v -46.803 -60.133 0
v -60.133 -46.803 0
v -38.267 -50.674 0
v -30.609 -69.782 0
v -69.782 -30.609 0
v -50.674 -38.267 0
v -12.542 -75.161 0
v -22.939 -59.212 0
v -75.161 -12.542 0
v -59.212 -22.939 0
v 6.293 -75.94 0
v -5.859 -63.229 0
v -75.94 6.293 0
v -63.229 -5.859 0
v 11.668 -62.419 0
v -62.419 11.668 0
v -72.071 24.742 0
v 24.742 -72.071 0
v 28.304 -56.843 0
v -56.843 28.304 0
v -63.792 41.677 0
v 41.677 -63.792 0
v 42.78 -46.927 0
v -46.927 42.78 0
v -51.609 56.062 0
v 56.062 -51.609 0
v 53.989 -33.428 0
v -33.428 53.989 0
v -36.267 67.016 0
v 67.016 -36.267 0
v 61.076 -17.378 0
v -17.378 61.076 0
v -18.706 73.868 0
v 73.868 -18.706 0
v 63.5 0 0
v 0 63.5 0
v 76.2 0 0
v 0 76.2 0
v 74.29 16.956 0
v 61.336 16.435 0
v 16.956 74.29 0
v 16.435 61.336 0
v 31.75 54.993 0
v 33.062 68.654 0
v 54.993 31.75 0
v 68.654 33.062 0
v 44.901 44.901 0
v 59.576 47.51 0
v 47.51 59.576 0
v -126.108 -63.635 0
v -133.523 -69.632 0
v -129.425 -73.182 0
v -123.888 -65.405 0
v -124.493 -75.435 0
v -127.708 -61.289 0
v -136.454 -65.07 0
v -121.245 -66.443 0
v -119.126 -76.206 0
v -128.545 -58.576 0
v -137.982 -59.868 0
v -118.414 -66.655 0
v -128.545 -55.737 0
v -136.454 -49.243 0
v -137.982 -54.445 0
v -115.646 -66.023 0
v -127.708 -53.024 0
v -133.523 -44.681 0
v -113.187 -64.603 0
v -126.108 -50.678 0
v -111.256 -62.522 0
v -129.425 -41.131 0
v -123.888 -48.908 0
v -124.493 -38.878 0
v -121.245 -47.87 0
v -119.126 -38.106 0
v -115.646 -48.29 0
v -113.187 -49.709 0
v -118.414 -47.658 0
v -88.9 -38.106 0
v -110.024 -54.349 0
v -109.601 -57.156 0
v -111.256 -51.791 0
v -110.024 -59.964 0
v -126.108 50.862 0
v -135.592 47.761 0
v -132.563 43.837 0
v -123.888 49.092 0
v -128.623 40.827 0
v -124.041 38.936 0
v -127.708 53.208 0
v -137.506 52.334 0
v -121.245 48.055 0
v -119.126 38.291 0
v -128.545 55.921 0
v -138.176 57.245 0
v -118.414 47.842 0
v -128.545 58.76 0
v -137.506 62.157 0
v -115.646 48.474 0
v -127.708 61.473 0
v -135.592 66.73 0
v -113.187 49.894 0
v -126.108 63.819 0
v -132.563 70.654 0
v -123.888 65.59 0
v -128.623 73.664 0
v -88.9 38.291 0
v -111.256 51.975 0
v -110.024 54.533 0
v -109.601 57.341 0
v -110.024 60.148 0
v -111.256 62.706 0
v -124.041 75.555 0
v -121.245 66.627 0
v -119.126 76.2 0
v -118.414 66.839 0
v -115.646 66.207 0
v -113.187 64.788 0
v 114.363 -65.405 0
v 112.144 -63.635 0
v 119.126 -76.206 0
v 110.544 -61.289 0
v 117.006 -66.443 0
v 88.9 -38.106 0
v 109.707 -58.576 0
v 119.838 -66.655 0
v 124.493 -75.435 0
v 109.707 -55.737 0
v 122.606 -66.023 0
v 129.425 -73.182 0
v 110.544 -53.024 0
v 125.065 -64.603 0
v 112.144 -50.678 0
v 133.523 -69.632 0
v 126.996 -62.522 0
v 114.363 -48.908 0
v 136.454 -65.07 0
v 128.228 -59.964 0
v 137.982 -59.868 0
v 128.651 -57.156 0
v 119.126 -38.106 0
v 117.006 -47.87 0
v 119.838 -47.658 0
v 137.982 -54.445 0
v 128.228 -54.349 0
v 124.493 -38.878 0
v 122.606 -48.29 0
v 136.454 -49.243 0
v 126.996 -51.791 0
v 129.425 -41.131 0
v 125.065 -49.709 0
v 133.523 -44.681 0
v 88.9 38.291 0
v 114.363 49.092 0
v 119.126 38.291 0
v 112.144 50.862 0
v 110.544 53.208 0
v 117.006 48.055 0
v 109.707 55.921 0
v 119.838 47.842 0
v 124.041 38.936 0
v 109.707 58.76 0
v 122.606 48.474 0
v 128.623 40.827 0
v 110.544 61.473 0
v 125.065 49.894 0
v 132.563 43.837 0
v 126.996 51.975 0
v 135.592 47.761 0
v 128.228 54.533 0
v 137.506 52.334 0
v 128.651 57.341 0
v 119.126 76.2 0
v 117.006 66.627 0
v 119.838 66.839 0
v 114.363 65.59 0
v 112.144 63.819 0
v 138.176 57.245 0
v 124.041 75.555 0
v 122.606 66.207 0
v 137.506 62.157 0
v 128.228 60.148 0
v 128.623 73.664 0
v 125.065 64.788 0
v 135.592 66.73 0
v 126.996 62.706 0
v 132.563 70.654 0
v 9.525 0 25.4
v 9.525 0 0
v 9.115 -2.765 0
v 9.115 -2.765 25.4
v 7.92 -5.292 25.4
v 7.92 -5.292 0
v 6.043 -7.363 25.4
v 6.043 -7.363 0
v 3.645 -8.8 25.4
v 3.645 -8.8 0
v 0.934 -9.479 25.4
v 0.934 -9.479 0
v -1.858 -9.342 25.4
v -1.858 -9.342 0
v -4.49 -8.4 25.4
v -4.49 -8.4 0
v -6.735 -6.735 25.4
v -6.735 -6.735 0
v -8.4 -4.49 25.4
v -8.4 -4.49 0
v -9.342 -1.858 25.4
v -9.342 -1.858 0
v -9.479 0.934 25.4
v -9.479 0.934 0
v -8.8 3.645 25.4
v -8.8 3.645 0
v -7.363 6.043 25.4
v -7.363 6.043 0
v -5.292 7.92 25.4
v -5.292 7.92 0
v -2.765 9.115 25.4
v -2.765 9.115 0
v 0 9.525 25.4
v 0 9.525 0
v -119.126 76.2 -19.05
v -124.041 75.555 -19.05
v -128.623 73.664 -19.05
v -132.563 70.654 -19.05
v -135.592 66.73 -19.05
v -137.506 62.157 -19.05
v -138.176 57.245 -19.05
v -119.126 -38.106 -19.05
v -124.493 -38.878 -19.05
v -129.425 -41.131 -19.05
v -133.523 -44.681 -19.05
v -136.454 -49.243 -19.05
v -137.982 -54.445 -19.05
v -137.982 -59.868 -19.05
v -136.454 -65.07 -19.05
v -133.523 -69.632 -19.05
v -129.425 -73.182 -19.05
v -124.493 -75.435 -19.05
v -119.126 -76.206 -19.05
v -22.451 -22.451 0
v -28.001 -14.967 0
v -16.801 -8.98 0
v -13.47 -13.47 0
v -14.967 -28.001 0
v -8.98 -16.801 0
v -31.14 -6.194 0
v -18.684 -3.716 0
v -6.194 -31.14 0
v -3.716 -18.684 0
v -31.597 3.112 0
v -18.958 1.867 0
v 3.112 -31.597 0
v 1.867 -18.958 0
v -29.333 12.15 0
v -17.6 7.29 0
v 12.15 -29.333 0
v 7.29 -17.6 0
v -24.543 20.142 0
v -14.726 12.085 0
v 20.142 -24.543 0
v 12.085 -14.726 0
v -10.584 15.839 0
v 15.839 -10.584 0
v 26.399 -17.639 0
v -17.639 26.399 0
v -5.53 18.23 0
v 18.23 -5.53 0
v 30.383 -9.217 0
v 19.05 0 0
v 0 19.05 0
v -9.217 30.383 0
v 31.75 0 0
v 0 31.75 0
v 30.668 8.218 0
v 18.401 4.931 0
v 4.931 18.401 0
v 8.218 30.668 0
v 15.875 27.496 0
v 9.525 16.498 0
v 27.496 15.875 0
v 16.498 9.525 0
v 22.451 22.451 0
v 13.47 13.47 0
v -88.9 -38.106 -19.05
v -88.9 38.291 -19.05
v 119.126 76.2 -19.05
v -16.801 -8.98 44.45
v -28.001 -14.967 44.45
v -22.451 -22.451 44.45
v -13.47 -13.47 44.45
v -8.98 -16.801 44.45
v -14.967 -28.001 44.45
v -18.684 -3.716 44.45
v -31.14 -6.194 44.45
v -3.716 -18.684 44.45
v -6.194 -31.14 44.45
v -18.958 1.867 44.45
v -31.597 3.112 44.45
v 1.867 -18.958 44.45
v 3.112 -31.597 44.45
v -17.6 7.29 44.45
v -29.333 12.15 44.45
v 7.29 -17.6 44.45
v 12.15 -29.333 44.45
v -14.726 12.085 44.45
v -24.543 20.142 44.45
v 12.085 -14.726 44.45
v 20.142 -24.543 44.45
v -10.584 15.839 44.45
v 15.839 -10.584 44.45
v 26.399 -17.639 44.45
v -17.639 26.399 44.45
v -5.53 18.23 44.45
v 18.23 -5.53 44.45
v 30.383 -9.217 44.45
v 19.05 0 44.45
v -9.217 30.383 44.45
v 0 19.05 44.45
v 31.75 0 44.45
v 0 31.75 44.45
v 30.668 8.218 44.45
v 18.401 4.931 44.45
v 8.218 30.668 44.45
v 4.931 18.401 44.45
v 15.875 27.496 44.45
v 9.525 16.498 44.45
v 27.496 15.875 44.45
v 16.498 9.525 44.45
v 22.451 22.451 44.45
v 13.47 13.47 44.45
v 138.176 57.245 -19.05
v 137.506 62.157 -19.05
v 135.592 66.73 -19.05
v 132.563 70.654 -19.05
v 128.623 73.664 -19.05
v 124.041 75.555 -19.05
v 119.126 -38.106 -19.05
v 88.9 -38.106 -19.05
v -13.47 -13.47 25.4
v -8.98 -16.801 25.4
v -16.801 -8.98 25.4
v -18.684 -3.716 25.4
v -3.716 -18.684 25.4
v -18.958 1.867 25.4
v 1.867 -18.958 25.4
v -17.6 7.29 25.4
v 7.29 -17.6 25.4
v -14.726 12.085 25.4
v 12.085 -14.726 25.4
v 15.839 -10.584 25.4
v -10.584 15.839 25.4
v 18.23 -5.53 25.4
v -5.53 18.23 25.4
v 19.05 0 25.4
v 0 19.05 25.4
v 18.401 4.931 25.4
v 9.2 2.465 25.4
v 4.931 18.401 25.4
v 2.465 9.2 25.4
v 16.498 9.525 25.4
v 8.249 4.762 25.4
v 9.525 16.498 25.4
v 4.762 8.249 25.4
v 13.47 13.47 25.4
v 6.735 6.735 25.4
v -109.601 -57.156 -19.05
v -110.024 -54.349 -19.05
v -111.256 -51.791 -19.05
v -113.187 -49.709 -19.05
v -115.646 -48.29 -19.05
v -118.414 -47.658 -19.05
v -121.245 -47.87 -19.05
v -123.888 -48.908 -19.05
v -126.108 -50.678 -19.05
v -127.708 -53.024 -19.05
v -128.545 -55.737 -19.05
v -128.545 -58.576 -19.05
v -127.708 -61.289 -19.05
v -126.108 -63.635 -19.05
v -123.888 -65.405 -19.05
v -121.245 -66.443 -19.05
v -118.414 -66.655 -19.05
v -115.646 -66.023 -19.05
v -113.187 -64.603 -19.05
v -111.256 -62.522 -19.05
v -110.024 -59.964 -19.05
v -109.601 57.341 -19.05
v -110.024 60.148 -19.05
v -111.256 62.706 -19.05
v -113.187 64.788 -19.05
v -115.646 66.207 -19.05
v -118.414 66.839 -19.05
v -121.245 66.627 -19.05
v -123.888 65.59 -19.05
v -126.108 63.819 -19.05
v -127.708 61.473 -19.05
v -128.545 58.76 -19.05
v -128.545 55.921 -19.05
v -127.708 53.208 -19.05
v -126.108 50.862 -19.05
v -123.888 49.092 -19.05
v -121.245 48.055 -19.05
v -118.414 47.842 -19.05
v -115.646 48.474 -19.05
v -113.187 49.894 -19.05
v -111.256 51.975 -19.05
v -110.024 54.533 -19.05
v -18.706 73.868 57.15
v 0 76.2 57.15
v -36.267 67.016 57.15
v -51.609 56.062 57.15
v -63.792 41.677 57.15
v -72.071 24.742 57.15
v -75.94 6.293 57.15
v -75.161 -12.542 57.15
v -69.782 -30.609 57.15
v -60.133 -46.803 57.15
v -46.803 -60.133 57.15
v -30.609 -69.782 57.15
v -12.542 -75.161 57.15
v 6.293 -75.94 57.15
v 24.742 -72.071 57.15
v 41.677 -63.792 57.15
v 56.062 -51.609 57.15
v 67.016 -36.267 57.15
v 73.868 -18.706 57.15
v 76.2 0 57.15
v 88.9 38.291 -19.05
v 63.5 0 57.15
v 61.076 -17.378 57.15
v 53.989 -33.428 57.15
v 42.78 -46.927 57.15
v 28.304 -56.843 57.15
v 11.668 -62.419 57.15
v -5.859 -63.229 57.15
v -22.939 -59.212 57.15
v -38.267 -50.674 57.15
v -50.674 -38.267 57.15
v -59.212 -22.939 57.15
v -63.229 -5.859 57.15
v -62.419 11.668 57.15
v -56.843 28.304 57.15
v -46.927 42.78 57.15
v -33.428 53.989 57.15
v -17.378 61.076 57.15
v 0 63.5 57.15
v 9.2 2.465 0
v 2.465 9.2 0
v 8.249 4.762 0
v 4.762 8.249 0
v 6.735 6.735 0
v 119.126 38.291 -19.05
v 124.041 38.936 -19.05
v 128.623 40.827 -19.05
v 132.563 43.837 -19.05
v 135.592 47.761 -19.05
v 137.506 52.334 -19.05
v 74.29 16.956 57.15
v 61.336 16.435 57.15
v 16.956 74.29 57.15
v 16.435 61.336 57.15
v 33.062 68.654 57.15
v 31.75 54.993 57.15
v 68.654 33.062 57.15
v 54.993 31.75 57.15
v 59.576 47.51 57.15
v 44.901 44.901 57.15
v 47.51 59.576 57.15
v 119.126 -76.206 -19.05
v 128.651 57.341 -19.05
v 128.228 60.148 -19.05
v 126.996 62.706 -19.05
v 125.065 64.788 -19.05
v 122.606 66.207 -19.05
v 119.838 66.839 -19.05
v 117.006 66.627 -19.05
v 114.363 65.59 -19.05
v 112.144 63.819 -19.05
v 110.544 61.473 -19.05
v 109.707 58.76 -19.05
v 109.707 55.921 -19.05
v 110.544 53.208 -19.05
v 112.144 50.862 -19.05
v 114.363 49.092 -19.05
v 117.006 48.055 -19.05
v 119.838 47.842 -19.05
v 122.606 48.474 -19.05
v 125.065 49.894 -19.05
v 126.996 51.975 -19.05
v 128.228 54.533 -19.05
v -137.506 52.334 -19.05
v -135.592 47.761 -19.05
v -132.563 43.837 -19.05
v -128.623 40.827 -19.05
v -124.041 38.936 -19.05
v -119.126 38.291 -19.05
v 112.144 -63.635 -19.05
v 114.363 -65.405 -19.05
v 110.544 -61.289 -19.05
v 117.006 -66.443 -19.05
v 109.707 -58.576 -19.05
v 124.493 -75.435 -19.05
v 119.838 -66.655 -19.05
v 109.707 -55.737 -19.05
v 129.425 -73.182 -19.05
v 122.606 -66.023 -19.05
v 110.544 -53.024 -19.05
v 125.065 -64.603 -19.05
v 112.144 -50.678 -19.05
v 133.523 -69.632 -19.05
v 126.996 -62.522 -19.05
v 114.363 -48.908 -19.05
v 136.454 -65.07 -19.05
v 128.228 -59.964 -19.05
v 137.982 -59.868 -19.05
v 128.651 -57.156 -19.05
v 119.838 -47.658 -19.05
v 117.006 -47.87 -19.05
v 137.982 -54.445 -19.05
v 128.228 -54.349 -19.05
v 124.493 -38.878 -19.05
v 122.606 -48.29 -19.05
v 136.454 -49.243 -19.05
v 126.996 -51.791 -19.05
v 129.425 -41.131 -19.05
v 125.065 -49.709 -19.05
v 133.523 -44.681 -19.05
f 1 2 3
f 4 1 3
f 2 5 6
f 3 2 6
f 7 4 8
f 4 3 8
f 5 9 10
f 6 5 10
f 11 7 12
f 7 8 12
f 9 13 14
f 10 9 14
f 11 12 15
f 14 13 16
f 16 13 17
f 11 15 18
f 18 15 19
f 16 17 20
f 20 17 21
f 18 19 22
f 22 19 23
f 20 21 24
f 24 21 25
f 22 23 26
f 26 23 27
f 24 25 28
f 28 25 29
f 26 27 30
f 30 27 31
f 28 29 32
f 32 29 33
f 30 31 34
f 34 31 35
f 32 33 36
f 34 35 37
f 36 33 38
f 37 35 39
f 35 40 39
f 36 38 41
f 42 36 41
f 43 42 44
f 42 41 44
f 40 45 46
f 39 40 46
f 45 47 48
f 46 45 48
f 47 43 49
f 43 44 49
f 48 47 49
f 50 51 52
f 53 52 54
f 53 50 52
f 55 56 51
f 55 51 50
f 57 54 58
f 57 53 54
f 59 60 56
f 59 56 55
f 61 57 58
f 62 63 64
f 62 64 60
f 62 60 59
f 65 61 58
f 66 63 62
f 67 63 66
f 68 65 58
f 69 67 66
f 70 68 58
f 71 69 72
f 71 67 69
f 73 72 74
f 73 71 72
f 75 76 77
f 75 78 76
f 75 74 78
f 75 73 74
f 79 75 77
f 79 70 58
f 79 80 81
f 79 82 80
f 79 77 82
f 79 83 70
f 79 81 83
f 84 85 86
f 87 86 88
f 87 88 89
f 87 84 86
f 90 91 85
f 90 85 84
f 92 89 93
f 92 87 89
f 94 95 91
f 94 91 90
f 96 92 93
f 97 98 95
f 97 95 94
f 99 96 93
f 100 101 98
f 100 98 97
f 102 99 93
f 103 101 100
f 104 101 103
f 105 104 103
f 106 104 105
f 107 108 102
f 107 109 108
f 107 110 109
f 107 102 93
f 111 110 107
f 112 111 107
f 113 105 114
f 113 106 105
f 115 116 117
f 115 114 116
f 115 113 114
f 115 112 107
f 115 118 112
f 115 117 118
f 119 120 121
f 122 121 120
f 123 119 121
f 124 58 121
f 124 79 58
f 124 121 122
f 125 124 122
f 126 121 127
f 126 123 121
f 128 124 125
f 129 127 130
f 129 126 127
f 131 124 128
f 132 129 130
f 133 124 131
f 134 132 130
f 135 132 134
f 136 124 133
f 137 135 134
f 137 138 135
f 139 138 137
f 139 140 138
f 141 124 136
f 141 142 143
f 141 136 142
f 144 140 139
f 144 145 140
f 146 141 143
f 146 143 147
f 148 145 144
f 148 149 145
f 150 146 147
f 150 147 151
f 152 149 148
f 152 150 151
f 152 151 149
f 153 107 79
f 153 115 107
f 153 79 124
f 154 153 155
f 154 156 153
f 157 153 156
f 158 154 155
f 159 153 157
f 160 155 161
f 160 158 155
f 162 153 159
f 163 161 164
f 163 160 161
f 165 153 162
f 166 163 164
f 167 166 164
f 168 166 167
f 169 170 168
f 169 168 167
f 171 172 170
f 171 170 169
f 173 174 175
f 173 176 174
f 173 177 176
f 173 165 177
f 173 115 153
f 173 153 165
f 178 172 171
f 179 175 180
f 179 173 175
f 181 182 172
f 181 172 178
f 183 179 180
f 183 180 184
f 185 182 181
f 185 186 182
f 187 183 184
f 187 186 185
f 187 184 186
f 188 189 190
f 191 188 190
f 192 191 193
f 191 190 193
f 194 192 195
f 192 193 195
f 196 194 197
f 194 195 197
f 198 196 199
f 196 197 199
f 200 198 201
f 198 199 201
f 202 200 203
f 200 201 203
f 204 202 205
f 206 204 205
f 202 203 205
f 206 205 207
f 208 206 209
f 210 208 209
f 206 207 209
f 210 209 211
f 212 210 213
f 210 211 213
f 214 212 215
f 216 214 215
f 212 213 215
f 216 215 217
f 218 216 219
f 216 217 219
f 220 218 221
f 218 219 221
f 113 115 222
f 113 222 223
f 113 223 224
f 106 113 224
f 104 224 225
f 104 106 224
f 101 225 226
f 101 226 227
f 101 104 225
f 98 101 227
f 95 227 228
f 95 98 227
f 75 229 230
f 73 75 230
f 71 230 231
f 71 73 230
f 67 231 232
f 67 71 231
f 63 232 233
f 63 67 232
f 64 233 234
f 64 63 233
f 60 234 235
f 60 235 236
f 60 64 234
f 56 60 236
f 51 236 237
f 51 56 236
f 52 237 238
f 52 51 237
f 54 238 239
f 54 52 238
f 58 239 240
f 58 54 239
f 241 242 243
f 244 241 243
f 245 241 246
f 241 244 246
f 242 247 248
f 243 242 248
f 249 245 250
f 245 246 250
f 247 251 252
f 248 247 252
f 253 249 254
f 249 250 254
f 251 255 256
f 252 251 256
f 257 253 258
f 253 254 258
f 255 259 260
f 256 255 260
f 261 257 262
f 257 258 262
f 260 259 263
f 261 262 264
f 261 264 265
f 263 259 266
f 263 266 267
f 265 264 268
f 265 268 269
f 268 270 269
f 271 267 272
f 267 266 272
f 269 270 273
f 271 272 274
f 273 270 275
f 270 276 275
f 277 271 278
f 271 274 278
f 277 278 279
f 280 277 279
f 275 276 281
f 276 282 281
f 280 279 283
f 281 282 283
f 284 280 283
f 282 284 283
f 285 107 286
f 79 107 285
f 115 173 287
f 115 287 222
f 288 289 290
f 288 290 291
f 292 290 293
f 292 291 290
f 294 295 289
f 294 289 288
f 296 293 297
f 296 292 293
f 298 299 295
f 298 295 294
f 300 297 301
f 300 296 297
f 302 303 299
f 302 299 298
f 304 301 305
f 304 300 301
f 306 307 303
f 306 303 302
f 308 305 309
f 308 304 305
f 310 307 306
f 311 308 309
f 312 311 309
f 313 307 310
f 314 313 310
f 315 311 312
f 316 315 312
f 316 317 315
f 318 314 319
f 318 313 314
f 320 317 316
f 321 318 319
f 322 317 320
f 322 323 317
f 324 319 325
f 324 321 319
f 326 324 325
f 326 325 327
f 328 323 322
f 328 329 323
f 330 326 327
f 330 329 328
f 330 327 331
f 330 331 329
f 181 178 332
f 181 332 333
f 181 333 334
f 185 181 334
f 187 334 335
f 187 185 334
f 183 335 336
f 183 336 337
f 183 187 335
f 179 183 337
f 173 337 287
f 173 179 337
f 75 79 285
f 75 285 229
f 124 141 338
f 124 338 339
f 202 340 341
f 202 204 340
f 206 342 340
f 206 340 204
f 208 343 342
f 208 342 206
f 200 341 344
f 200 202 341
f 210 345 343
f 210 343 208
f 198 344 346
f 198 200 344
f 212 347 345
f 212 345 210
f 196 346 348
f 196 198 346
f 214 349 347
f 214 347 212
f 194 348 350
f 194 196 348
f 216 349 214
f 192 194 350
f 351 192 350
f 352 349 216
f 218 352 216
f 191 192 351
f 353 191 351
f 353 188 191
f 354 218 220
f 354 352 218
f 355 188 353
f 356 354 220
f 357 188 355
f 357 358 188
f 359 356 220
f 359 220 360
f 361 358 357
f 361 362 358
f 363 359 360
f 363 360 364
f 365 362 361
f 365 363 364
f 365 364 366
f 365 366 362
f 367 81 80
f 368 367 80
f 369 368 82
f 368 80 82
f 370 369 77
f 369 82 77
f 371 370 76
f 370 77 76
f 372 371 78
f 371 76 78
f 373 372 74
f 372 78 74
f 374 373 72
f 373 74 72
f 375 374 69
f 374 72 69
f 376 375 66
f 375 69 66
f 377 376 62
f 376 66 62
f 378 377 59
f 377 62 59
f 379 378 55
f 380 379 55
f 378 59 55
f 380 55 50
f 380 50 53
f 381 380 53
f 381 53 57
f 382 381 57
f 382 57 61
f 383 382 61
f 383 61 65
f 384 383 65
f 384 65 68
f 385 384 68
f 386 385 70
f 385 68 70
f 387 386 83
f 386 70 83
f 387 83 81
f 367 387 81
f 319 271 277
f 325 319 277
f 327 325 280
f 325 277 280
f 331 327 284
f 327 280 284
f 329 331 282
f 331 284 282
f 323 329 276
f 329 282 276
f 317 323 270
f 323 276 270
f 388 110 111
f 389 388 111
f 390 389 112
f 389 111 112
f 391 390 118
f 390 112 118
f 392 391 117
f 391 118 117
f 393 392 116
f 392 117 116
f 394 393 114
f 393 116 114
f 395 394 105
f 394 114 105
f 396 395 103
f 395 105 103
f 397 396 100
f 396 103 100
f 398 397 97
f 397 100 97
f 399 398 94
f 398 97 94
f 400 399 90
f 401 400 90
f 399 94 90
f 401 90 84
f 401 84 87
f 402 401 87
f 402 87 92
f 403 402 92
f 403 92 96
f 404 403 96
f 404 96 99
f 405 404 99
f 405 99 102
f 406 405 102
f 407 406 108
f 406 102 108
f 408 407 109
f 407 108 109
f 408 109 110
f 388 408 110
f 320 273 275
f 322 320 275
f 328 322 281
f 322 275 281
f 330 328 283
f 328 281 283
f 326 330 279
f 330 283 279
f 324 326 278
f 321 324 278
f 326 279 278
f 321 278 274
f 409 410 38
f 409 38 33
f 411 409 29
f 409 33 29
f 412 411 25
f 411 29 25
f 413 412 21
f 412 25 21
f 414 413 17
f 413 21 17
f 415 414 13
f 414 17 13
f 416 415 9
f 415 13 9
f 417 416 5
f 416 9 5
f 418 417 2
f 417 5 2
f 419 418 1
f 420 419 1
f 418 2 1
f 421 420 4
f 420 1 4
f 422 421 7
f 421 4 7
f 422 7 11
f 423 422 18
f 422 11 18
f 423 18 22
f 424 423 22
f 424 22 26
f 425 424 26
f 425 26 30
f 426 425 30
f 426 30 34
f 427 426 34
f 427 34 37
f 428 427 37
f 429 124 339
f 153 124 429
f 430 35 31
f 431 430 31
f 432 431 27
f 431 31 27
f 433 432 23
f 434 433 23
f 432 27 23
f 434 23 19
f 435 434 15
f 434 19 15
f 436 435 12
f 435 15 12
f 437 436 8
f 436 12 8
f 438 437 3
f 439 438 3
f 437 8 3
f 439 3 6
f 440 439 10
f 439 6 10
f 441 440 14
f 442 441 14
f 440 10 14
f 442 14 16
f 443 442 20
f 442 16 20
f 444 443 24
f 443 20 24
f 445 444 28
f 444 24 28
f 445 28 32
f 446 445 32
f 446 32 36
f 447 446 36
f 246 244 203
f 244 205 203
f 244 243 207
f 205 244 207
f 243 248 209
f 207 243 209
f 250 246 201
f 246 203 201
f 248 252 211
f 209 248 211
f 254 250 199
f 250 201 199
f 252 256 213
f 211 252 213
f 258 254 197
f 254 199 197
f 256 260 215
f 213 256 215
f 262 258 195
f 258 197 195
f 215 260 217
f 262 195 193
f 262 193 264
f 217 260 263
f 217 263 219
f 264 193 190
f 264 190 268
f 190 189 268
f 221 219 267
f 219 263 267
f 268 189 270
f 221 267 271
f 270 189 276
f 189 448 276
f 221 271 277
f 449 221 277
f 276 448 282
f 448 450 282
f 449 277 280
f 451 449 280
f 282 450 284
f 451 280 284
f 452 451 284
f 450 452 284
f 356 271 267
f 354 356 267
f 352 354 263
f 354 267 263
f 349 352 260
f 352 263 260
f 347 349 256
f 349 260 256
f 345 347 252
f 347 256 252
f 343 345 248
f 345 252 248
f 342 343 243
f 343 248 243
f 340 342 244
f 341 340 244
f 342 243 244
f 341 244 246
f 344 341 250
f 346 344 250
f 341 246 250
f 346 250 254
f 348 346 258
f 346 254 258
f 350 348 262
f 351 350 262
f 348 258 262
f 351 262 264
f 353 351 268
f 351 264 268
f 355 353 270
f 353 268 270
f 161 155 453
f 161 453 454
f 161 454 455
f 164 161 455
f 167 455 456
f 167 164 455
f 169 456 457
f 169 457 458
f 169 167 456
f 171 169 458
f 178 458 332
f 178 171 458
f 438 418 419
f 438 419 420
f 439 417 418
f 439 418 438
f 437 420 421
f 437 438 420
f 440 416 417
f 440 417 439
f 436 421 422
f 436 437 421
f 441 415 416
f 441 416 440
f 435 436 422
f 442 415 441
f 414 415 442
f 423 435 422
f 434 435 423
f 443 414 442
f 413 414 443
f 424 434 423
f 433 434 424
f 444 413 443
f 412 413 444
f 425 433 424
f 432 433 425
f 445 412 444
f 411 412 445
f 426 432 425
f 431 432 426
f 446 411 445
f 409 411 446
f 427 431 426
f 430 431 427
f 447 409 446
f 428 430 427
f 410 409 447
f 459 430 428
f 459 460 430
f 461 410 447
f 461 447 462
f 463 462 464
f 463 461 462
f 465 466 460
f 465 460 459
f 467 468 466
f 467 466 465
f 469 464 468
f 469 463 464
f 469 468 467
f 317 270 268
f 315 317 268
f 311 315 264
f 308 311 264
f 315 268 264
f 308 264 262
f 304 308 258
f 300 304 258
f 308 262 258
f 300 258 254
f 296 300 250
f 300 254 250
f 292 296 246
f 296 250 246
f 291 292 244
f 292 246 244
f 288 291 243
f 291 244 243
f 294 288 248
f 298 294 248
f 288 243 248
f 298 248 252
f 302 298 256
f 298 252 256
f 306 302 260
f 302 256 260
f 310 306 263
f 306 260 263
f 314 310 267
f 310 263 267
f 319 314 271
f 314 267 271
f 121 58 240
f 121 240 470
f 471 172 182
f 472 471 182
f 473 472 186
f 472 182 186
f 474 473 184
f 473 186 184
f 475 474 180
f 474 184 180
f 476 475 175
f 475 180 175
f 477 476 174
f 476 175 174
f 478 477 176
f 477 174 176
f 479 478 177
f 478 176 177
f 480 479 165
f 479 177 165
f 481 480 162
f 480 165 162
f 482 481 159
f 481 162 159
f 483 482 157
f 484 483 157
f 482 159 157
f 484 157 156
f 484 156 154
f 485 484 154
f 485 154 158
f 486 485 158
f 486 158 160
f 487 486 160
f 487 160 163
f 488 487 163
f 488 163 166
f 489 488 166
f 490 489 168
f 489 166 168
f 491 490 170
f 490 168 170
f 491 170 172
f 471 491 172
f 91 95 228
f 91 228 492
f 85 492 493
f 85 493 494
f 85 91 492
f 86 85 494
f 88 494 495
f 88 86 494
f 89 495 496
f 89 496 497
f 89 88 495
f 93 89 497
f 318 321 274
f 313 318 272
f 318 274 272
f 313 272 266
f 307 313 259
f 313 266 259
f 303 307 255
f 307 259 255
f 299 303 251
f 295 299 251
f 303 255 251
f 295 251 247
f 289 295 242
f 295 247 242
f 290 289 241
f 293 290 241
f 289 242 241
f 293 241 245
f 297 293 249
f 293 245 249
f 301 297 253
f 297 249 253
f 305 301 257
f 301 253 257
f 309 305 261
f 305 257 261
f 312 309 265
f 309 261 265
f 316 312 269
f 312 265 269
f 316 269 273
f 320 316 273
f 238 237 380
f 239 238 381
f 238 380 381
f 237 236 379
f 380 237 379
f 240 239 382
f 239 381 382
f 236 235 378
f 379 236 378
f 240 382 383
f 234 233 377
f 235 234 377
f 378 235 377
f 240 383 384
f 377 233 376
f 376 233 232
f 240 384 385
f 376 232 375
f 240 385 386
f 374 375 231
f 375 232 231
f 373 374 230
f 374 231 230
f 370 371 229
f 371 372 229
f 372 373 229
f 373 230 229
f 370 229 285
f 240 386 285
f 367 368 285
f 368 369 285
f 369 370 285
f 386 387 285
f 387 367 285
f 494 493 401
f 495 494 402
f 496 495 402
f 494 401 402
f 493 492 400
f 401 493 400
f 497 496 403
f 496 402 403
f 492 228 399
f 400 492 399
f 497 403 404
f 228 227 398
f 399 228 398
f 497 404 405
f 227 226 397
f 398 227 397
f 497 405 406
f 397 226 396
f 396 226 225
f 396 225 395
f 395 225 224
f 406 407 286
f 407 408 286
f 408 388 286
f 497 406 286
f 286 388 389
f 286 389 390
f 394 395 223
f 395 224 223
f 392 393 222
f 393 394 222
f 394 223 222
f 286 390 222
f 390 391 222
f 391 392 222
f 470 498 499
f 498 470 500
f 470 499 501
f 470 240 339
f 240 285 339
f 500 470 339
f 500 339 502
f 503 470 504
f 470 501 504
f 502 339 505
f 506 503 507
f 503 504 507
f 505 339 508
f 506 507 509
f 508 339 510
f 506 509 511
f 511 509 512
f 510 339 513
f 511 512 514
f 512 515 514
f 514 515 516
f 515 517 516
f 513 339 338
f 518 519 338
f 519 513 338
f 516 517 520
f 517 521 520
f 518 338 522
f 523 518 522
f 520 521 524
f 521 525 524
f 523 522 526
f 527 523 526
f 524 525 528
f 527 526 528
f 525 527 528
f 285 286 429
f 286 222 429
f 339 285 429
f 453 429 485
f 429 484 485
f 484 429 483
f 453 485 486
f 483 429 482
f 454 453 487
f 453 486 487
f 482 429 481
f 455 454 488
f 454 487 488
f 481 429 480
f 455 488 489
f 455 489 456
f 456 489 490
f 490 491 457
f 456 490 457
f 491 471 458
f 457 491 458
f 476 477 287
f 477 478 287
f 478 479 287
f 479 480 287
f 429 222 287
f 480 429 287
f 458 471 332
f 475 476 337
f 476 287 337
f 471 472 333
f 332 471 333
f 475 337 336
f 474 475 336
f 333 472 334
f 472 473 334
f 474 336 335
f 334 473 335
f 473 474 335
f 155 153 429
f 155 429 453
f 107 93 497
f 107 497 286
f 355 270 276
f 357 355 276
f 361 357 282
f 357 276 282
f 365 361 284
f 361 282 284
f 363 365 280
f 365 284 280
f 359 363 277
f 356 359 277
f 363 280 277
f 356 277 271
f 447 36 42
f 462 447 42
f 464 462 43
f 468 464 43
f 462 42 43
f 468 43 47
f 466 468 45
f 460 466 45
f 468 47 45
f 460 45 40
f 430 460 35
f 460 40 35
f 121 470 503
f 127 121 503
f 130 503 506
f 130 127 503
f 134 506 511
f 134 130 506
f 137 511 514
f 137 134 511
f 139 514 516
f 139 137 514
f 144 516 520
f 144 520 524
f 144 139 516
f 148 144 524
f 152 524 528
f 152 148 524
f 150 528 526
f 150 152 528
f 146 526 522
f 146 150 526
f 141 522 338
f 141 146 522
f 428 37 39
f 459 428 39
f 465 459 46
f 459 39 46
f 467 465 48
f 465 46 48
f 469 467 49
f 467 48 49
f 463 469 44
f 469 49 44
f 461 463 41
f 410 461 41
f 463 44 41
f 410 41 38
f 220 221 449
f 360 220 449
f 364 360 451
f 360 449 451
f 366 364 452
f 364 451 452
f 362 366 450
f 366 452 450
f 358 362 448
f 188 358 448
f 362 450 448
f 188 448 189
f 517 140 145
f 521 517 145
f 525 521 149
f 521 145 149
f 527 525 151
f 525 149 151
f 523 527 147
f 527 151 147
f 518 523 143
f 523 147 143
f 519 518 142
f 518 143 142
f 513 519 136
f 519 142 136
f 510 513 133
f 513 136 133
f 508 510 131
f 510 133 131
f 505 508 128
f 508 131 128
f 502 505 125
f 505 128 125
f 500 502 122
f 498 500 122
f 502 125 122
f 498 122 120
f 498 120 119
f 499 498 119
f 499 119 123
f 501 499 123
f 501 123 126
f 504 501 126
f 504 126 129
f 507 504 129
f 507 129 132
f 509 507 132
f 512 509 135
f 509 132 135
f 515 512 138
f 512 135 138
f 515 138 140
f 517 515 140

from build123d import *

# Parameters (mm, degrees)
F0_R     = 9.525
F1_DEPTH = 19.05
F2_DEPTH = 57.15
F3_DEPTH = 44.45
F4_DEPTH = 25.4


with BuildPart() as f1:
    # F0 (on Top) → F1 (new body)
    with BuildSketch(Plane.XY):
        with BuildLine():
            Line((-88.899997, 38.29073), (-88.899997, 76.2))
            Line((-88.899997, 76.2), (-119.125959, 76.2))
            ThreePointArc((-119.125959, 76.2), (-132.562584, 70.654059), (-138.17572, 57.245365))
            ThreePointArc((-138.17572, 57.245365), (-132.562584, 43.836671), (-119.125959, 38.29073))
            Line((-119.125959, 38.29073), (-88.899997, 38.29073))
        make_face()
        with Locations((-119.125959, 57.34073)):
            Circle(F0_R, mode=Mode.SUBTRACT)
        with BuildLine():
            Line((-88.899997, -76.20642), (-88.899997, -38.10642))
            Line((-88.899997, -38.10642), (-119.125959, -38.10642))
            ThreePointArc((-119.125959, -38.10642), (-138.175959, -57.15642), (-119.125959, -76.20642))
            Line((-119.125959, -76.20642), (-88.899997, -76.20642))
        make_face()
        with Locations((-119.125959, -57.15642)):
            Circle(F0_R, mode=Mode.SUBTRACT)
        with BuildLine():
            Line((119.125959, 76.2), (88.899997, 76.2))
            Line((88.899997, 76.2), (88.899997, 38.29073))
            Line((88.899997, 38.29073), (119.125959, 38.29073))
            ThreePointArc((119.125959, 38.29073), (132.562584, 43.836671), (138.17572, 57.245365))
            ThreePointArc((138.17572, 57.245365), (132.562584, 70.654059), (119.125959, 76.2))
        make_face()
        with Locations((119.125959, 57.34073)):
            Circle(F0_R, mode=Mode.SUBTRACT)
        with BuildLine():
            Line((119.125959, -38.10642), (88.899997, -38.10642))
            Line((88.899997, -38.10642), (88.899997, -76.20642))
            Line((88.899997, -76.20642), (119.125959, -76.20642))
            ThreePointArc((119.125959, -76.20642), (138.175959, -57.15642), (119.125959, -38.10642))
        make_face()
        with Locations((119.125959, -57.15642)):
            Circle(F0_R, mode=Mode.SUBTRACT)
        Polygon((76.199997, 76.2), (0, 76.2), (-88.899997, 76.2), (-88.899997, 38.29073), (-88.899997, -38.10642), (-88.899997, -76.20642), (88.899997, -76.20642), (88.899997, -38.10642), (88.899997, 38.29073), (88.899997, 76.2), align=None)
        with BuildLine():
            ThreePointArc((76.2, 0), (-53.881537, -53.881537), (0, 76.2))
            ThreePointArc((0, 76.2), (53.881537, 53.881537), (76.2, 0))
        make_face(mode=Mode.SUBTRACT)
        with BuildLine():
            ThreePointArc((76.2, 0), (53.881537, 53.881537), (0, 76.2))
            ThreePointArc((0, 76.2), (-53.881537, -53.881537), (76.2, 0))
        make_face()
        with BuildLine():
            ThreePointArc((63.5, 0), (-44.901281, -44.901281), (0, 63.5))
            ThreePointArc((0, 63.5), (44.901281, 44.901281), (63.5, 0))
        make_face(mode=Mode.SUBTRACT)
        with BuildLine():
            ThreePointArc((63.5, 0), (44.901281, 44.901281), (0, 63.5))
            ThreePointArc((0, 63.5), (-44.901281, -44.901281), (63.5, 0))
        make_face()
        with BuildLine():
            ThreePointArc((31.75, 0), (-22.45064, -22.45064), (0, 31.75))
            ThreePointArc((0, 31.75), (22.45064, 22.45064), (31.75, 0))
        make_face(mode=Mode.SUBTRACT)
        with BuildLine():
            ThreePointArc((31.75, 0), (22.45064, 22.45064), (0, 31.75))
            ThreePointArc((0, 31.75), (-22.45064, -22.45064), (31.75, 0))
        make_face()
        with BuildLine():
            ThreePointArc((0, 19.05), (13.470384, 13.470384), (19.05, 0))
            ThreePointArc((19.05, 0), (-13.470384, -13.470384), (0, 19.05))
        make_face(mode=Mode.SUBTRACT)
        with BuildLine():
            ThreePointArc((0, 19.05), (-13.470384, -13.470384), (19.05, 0))
            ThreePointArc((19.05, 0), (13.470384, 13.470384), (0, 19.05))
        make_face()
        with BuildLine():
            ThreePointArc((9.525, 0), (-6.735192, -6.735192), (0, 9.525))
            ThreePointArc((0, 9.525), (6.735192, 6.735192), (9.525, 0))
        make_face(mode=Mode.SUBTRACT)
        with BuildLine():
            ThreePointArc((9.525, 0), (6.735192, 6.735192), (0, 9.525))
            ThreePointArc((0, 9.525), (-6.735192, -6.735192), (9.525, 0))
        make_face()
    extrude(amount=-F1_DEPTH)


with BuildPart() as f2:
    # F0 (on Top) → F2 (new body)
    with BuildSketch(Plane.XY):
        with BuildLine():
            ThreePointArc((76.2, 0), (53.881537, 53.881537), (0, 76.2))
            ThreePointArc((0, 76.2), (-53.881537, -53.881537), (76.2, 0))
        make_face()
        with BuildLine():
            ThreePointArc((63.5, 0), (-44.901281, -44.901281), (0, 63.5))
            ThreePointArc((0, 63.5), (44.901281, 44.901281), (63.5, 0))
        make_face(mode=Mode.SUBTRACT)
    extrude(amount=F2_DEPTH)


with BuildPart() as f3:
    # F0 (on Top) → F3 (new body)
    with BuildSketch(Plane.XY):
        with BuildLine():
            ThreePointArc((31.75, 0), (22.45064, 22.45064), (0, 31.75))
            ThreePointArc((0, 31.75), (-22.45064, -22.45064), (31.75, 0))
        make_face()
        with BuildLine():
            ThreePointArc((0, 19.05), (13.470384, 13.470384), (19.05, 0))
            ThreePointArc((19.05, 0), (-13.470384, -13.470384), (0, 19.05))
        make_face(mode=Mode.SUBTRACT)
    extrude(amount=F3_DEPTH)


with BuildPart() as f4:
    # F0 (on Top) → F4 (new body)
    with BuildSketch(Plane.XY):
        with BuildLine():
            ThreePointArc((0, 19.05), (-13.470384, -13.470384), (19.05, 0))
            ThreePointArc((19.05, 0), (13.470384, 13.470384), (0, 19.05))
        make_face()
        with BuildLine():
            ThreePointArc((9.525, 0), (-6.735192, -6.735192), (0, 9.525))
            ThreePointArc((0, 9.525), (6.735192, 6.735192), (9.525, 0))
        make_face(mode=Mode.SUBTRACT)
    extrude(amount=F4_DEPTH)


solid = Compound([f1.part, f2.part, f3.part, f4.part])
